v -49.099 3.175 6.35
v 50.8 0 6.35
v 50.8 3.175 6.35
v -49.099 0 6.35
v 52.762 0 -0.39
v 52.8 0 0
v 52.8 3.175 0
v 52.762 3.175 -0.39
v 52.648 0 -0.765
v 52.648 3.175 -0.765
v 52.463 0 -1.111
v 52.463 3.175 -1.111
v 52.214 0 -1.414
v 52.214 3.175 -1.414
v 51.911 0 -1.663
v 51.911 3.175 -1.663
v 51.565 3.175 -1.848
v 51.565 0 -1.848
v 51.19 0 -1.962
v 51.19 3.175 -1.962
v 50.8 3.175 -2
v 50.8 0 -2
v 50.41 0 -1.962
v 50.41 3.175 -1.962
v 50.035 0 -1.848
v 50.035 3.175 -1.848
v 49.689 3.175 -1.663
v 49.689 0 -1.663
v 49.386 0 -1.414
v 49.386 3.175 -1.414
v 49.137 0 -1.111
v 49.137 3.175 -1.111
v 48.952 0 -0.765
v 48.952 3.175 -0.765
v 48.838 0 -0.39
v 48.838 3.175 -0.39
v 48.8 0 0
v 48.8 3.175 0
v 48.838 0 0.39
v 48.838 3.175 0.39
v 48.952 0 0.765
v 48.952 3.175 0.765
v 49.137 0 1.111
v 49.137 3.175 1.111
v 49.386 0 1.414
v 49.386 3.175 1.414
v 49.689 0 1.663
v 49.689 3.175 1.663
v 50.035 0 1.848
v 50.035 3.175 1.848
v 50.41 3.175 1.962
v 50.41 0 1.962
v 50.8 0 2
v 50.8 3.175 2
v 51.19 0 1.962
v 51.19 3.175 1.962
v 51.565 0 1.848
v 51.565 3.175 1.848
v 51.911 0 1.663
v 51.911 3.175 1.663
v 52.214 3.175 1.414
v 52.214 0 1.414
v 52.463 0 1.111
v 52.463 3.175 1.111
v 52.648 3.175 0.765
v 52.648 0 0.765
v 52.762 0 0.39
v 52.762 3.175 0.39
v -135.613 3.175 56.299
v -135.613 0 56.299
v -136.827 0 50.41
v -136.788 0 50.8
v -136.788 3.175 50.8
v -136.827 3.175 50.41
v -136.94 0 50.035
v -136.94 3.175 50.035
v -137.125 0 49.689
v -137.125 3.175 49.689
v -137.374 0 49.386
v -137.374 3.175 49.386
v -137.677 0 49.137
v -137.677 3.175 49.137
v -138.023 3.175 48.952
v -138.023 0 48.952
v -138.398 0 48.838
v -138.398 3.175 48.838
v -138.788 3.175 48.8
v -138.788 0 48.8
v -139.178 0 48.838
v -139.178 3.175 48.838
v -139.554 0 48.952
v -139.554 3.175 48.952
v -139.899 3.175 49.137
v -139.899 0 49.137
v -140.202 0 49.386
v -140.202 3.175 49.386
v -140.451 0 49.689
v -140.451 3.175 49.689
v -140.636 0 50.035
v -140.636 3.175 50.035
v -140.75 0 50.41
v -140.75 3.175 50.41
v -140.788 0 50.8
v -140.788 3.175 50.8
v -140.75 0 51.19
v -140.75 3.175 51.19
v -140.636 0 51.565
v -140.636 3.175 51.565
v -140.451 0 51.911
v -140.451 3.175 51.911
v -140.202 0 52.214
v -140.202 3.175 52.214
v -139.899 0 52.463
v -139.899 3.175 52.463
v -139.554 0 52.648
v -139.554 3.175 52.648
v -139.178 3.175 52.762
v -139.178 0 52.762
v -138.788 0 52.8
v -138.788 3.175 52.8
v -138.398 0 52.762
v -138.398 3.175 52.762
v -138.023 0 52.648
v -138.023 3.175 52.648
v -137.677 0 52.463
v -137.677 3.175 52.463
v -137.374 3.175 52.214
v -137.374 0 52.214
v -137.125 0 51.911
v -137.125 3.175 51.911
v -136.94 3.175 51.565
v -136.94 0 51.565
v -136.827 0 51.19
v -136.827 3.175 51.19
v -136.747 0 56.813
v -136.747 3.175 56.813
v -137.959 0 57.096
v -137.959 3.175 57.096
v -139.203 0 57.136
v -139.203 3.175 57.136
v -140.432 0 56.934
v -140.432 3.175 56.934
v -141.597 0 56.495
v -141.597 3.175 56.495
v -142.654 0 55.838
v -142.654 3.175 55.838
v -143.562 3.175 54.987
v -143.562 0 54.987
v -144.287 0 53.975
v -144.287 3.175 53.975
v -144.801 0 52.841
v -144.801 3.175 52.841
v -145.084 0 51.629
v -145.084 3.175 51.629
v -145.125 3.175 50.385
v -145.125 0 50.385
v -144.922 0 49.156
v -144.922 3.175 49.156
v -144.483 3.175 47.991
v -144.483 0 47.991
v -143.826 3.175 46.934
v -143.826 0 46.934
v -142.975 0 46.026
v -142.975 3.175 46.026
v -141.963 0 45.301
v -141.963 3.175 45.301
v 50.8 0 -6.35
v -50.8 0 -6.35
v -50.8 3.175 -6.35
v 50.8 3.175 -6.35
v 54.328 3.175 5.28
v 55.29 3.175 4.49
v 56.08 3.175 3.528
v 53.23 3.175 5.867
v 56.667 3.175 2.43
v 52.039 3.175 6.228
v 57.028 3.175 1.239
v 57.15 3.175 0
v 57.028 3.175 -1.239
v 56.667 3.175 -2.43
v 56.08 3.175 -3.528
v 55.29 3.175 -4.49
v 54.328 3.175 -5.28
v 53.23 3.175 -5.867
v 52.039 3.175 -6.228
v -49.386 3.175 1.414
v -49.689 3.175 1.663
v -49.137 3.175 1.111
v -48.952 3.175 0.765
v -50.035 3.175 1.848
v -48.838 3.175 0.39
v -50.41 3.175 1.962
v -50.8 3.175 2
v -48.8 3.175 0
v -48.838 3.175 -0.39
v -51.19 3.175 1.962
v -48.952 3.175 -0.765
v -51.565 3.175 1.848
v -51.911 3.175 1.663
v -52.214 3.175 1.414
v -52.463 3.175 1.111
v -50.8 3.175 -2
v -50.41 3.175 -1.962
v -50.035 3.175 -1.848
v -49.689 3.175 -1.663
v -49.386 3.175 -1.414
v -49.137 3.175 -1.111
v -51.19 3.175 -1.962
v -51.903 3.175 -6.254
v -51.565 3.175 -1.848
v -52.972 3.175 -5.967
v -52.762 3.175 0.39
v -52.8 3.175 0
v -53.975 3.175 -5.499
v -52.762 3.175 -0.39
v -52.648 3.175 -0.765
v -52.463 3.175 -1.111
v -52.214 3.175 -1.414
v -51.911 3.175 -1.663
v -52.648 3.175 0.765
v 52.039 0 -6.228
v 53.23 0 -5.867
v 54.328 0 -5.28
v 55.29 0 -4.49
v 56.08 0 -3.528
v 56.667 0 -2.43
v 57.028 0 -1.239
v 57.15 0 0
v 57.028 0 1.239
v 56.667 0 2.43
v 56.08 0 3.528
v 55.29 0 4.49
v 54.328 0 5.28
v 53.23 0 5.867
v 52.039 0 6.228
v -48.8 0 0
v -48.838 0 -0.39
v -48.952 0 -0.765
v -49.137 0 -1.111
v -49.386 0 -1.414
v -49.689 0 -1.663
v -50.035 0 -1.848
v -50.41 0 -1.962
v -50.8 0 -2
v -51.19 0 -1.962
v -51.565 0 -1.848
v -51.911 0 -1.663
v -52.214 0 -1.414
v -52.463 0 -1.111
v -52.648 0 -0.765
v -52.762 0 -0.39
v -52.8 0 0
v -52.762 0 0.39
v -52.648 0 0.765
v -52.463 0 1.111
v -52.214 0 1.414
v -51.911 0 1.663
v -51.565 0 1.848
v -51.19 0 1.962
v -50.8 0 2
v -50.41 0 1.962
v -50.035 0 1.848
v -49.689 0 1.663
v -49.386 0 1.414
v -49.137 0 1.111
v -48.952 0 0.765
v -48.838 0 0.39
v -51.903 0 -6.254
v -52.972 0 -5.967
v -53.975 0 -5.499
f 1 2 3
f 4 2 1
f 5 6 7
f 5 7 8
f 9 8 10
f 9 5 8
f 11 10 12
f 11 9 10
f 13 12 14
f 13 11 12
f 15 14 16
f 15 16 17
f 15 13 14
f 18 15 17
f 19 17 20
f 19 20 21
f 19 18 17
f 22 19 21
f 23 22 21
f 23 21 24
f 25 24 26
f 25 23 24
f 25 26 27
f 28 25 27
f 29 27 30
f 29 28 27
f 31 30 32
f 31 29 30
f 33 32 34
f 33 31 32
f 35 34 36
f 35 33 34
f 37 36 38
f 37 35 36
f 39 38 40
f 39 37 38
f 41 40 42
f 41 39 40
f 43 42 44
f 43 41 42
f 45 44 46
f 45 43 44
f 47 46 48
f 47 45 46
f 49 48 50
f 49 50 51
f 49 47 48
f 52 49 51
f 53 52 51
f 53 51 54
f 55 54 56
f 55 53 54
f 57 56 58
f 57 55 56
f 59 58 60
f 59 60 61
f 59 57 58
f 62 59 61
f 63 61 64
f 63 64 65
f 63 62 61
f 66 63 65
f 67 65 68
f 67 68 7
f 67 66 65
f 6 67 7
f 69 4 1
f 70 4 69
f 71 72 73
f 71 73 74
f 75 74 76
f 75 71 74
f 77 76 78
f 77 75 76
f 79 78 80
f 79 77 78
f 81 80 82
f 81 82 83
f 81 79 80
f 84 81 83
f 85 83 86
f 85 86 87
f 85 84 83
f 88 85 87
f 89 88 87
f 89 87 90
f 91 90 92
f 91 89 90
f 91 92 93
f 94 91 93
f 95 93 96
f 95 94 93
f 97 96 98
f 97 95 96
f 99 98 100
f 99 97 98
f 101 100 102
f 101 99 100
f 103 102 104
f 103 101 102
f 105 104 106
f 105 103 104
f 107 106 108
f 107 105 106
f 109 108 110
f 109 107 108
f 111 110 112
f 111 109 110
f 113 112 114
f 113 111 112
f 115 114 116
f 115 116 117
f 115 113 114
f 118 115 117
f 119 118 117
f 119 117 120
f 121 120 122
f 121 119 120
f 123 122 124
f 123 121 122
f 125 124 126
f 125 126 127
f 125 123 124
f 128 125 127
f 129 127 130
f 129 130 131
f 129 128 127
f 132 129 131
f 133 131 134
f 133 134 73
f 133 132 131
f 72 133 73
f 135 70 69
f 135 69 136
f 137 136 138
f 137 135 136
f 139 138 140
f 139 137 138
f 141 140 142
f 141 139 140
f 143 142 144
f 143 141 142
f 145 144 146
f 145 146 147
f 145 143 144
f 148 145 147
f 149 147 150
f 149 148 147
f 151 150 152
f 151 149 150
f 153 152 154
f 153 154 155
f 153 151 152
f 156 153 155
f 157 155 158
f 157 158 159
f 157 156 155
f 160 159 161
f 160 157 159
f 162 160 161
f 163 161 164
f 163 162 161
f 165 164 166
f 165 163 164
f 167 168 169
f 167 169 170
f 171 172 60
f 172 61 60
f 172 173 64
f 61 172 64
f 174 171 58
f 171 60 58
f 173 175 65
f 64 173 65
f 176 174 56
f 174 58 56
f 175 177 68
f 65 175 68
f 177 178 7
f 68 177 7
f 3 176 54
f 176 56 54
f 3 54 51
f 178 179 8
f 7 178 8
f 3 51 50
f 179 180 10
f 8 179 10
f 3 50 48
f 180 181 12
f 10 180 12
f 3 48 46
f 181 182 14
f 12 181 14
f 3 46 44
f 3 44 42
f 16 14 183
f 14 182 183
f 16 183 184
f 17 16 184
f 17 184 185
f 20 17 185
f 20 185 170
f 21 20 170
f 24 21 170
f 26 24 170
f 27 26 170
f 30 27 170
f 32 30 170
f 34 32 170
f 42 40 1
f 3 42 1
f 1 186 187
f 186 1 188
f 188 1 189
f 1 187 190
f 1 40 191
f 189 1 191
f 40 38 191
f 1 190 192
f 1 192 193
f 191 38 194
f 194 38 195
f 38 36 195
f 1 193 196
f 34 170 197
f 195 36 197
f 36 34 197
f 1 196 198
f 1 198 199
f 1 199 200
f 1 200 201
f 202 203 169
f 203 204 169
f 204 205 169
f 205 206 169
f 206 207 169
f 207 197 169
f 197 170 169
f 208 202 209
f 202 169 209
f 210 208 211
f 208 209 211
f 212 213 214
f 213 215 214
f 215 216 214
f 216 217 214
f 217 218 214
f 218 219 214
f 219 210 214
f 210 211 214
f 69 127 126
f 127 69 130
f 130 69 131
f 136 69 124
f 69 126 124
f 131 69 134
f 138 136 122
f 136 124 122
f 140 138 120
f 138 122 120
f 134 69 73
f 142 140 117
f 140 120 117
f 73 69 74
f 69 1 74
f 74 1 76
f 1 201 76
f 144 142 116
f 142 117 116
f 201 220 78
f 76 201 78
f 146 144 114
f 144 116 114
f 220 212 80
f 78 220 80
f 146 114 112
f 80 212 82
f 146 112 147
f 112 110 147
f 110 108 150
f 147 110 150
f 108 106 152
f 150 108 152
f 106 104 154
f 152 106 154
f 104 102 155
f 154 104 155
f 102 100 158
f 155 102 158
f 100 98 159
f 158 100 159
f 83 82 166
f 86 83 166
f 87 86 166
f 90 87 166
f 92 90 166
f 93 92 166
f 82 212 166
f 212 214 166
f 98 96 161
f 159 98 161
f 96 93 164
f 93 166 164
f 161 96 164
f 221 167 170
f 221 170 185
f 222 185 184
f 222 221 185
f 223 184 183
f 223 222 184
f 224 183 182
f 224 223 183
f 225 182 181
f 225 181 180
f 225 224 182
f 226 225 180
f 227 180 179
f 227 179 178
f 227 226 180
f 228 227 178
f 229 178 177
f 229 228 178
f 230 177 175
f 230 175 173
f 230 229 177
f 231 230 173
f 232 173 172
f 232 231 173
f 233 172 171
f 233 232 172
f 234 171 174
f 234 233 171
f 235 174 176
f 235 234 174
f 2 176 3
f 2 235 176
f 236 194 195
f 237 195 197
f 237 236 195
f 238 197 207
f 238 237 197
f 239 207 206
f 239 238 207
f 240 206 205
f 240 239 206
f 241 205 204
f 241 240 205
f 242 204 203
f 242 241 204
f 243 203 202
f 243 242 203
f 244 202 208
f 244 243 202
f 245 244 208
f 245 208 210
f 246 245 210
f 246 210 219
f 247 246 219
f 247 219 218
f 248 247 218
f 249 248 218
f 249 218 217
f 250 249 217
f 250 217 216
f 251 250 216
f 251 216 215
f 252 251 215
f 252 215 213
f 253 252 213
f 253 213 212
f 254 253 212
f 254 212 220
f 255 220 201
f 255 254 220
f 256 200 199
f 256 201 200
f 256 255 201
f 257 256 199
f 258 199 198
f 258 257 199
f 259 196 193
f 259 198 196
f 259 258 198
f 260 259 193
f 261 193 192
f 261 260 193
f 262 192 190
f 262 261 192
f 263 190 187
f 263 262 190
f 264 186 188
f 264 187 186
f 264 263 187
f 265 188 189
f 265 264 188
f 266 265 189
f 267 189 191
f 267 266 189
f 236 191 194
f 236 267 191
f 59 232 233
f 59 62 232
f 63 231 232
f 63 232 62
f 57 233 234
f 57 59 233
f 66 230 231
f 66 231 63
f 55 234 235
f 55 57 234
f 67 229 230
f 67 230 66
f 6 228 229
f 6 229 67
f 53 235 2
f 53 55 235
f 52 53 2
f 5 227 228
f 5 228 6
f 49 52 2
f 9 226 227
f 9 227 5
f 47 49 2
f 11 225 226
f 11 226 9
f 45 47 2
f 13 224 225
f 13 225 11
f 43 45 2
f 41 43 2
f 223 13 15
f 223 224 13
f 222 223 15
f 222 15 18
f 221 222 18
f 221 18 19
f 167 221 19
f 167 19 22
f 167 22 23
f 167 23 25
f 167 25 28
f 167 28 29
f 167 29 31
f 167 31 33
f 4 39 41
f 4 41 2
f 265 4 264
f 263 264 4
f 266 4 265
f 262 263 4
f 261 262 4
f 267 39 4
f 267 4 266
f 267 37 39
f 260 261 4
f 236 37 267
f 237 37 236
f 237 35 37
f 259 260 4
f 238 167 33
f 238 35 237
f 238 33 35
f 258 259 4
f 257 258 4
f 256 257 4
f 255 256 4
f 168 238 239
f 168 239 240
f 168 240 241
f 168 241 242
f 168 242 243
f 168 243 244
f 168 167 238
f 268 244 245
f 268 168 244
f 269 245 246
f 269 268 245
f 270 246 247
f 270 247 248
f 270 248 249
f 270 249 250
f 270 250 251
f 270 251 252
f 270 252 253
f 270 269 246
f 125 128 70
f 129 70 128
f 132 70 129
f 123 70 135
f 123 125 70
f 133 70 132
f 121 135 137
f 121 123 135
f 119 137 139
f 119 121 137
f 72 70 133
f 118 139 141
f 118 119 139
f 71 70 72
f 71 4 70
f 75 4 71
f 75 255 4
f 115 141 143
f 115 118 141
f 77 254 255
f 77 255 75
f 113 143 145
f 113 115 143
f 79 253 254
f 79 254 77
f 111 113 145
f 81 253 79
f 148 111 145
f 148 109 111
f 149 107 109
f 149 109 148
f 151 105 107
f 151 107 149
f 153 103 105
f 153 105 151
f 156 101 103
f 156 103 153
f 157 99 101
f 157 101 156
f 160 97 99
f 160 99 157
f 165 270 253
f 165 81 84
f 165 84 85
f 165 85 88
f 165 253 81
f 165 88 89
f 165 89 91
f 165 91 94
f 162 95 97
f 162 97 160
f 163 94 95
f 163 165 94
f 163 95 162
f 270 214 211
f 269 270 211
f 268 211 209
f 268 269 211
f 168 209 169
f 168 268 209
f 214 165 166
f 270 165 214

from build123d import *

# Parameters (mm, degrees)
SKETCH1_R               = 2.000000064
BOSS_EXTRUDE1_DEPTH     = 3.175
SKETCH2_R               = 2.000000064
BOSS_EXTRUDE2_DEPTH     = 3.175
SKETCH1_2_R             = 2.000000064
CUT_EXTRUDE4_DEPTH      = 3.81
CUT_EXTRUDE4_DEPTH_BACK = 3.81


with BuildPart() as part:
    # Sketch1 → Boss-Extrude1 (new body)
    with BuildSketch(Plane(origin=(0, 0, 0), x_dir=(1, 0, 0), z_dir=(0, 1, 0))):
        with BuildLine():
            Line((-50.8, 6.35), (50.8, 6.35))
            ThreePointArc((50.8, 6.35), (57.15, 0), (50.8, -6.35))
            Line((50.8, -6.35), (-50.8, -6.35))
            ThreePointArc((-50.8, -6.35), (-57.15, 0), (-50.8, 6.35))
        make_face()
        with Locations((-50.8, 0)):
            Circle(SKETCH1_R, mode=Mode.SUBTRACT)
        with Locations((50.8, 0)):
            Circle(SKETCH1_R, mode=Mode.SUBTRACT)
    extrude(amount=BOSS_EXTRUDE1_DEPTH)

    # Sketch2 → Boss-Extrude2 (add)
    with BuildSketch(Plane(origin=(0, 0, 0), x_dir=(1, 0, 0), z_dir=(0, 1, 0))):
        with BuildLine():
            Line((-141.963181024, -45.300738686), (-53.975, 5.499261314))
            ThreePointArc((-53.975, 5.499261314), (-45.300738686, 3.175), (-47.625, -5.499261314))
            Line((-47.625, -5.499261314), (-135.613181024, -56.299261314))
            ThreePointArc((-135.613181024, -56.299261314), (-144.287442339, -53.975), (-141.963181024, -45.300738686))
        make_face()
        with Locations((-138.788181024, -50.8)):
            Circle(SKETCH2_R, mode=Mode.SUBTRACT)
    extrude(amount=BOSS_EXTRUDE2_DEPTH)

    # Sketch1_2 → Cut-Extrude4 (cut, two sides)
    with BuildSketch(Plane(origin=(0, 0, 0), x_dir=(1, 0, 0), z_dir=(0, 1, 0))) as cut_extrude4_sk:
        with Locations((-50.8, 0)):
            Circle(SKETCH1_2_R)
    extrude(amount=CUT_EXTRUDE4_DEPTH, mode=Mode.SUBTRACT)
    extrude(cut_extrude4_sk.sketch, amount=-CUT_EXTRUDE4_DEPTH_BACK, mode=Mode.SUBTRACT)


solid = part.part
